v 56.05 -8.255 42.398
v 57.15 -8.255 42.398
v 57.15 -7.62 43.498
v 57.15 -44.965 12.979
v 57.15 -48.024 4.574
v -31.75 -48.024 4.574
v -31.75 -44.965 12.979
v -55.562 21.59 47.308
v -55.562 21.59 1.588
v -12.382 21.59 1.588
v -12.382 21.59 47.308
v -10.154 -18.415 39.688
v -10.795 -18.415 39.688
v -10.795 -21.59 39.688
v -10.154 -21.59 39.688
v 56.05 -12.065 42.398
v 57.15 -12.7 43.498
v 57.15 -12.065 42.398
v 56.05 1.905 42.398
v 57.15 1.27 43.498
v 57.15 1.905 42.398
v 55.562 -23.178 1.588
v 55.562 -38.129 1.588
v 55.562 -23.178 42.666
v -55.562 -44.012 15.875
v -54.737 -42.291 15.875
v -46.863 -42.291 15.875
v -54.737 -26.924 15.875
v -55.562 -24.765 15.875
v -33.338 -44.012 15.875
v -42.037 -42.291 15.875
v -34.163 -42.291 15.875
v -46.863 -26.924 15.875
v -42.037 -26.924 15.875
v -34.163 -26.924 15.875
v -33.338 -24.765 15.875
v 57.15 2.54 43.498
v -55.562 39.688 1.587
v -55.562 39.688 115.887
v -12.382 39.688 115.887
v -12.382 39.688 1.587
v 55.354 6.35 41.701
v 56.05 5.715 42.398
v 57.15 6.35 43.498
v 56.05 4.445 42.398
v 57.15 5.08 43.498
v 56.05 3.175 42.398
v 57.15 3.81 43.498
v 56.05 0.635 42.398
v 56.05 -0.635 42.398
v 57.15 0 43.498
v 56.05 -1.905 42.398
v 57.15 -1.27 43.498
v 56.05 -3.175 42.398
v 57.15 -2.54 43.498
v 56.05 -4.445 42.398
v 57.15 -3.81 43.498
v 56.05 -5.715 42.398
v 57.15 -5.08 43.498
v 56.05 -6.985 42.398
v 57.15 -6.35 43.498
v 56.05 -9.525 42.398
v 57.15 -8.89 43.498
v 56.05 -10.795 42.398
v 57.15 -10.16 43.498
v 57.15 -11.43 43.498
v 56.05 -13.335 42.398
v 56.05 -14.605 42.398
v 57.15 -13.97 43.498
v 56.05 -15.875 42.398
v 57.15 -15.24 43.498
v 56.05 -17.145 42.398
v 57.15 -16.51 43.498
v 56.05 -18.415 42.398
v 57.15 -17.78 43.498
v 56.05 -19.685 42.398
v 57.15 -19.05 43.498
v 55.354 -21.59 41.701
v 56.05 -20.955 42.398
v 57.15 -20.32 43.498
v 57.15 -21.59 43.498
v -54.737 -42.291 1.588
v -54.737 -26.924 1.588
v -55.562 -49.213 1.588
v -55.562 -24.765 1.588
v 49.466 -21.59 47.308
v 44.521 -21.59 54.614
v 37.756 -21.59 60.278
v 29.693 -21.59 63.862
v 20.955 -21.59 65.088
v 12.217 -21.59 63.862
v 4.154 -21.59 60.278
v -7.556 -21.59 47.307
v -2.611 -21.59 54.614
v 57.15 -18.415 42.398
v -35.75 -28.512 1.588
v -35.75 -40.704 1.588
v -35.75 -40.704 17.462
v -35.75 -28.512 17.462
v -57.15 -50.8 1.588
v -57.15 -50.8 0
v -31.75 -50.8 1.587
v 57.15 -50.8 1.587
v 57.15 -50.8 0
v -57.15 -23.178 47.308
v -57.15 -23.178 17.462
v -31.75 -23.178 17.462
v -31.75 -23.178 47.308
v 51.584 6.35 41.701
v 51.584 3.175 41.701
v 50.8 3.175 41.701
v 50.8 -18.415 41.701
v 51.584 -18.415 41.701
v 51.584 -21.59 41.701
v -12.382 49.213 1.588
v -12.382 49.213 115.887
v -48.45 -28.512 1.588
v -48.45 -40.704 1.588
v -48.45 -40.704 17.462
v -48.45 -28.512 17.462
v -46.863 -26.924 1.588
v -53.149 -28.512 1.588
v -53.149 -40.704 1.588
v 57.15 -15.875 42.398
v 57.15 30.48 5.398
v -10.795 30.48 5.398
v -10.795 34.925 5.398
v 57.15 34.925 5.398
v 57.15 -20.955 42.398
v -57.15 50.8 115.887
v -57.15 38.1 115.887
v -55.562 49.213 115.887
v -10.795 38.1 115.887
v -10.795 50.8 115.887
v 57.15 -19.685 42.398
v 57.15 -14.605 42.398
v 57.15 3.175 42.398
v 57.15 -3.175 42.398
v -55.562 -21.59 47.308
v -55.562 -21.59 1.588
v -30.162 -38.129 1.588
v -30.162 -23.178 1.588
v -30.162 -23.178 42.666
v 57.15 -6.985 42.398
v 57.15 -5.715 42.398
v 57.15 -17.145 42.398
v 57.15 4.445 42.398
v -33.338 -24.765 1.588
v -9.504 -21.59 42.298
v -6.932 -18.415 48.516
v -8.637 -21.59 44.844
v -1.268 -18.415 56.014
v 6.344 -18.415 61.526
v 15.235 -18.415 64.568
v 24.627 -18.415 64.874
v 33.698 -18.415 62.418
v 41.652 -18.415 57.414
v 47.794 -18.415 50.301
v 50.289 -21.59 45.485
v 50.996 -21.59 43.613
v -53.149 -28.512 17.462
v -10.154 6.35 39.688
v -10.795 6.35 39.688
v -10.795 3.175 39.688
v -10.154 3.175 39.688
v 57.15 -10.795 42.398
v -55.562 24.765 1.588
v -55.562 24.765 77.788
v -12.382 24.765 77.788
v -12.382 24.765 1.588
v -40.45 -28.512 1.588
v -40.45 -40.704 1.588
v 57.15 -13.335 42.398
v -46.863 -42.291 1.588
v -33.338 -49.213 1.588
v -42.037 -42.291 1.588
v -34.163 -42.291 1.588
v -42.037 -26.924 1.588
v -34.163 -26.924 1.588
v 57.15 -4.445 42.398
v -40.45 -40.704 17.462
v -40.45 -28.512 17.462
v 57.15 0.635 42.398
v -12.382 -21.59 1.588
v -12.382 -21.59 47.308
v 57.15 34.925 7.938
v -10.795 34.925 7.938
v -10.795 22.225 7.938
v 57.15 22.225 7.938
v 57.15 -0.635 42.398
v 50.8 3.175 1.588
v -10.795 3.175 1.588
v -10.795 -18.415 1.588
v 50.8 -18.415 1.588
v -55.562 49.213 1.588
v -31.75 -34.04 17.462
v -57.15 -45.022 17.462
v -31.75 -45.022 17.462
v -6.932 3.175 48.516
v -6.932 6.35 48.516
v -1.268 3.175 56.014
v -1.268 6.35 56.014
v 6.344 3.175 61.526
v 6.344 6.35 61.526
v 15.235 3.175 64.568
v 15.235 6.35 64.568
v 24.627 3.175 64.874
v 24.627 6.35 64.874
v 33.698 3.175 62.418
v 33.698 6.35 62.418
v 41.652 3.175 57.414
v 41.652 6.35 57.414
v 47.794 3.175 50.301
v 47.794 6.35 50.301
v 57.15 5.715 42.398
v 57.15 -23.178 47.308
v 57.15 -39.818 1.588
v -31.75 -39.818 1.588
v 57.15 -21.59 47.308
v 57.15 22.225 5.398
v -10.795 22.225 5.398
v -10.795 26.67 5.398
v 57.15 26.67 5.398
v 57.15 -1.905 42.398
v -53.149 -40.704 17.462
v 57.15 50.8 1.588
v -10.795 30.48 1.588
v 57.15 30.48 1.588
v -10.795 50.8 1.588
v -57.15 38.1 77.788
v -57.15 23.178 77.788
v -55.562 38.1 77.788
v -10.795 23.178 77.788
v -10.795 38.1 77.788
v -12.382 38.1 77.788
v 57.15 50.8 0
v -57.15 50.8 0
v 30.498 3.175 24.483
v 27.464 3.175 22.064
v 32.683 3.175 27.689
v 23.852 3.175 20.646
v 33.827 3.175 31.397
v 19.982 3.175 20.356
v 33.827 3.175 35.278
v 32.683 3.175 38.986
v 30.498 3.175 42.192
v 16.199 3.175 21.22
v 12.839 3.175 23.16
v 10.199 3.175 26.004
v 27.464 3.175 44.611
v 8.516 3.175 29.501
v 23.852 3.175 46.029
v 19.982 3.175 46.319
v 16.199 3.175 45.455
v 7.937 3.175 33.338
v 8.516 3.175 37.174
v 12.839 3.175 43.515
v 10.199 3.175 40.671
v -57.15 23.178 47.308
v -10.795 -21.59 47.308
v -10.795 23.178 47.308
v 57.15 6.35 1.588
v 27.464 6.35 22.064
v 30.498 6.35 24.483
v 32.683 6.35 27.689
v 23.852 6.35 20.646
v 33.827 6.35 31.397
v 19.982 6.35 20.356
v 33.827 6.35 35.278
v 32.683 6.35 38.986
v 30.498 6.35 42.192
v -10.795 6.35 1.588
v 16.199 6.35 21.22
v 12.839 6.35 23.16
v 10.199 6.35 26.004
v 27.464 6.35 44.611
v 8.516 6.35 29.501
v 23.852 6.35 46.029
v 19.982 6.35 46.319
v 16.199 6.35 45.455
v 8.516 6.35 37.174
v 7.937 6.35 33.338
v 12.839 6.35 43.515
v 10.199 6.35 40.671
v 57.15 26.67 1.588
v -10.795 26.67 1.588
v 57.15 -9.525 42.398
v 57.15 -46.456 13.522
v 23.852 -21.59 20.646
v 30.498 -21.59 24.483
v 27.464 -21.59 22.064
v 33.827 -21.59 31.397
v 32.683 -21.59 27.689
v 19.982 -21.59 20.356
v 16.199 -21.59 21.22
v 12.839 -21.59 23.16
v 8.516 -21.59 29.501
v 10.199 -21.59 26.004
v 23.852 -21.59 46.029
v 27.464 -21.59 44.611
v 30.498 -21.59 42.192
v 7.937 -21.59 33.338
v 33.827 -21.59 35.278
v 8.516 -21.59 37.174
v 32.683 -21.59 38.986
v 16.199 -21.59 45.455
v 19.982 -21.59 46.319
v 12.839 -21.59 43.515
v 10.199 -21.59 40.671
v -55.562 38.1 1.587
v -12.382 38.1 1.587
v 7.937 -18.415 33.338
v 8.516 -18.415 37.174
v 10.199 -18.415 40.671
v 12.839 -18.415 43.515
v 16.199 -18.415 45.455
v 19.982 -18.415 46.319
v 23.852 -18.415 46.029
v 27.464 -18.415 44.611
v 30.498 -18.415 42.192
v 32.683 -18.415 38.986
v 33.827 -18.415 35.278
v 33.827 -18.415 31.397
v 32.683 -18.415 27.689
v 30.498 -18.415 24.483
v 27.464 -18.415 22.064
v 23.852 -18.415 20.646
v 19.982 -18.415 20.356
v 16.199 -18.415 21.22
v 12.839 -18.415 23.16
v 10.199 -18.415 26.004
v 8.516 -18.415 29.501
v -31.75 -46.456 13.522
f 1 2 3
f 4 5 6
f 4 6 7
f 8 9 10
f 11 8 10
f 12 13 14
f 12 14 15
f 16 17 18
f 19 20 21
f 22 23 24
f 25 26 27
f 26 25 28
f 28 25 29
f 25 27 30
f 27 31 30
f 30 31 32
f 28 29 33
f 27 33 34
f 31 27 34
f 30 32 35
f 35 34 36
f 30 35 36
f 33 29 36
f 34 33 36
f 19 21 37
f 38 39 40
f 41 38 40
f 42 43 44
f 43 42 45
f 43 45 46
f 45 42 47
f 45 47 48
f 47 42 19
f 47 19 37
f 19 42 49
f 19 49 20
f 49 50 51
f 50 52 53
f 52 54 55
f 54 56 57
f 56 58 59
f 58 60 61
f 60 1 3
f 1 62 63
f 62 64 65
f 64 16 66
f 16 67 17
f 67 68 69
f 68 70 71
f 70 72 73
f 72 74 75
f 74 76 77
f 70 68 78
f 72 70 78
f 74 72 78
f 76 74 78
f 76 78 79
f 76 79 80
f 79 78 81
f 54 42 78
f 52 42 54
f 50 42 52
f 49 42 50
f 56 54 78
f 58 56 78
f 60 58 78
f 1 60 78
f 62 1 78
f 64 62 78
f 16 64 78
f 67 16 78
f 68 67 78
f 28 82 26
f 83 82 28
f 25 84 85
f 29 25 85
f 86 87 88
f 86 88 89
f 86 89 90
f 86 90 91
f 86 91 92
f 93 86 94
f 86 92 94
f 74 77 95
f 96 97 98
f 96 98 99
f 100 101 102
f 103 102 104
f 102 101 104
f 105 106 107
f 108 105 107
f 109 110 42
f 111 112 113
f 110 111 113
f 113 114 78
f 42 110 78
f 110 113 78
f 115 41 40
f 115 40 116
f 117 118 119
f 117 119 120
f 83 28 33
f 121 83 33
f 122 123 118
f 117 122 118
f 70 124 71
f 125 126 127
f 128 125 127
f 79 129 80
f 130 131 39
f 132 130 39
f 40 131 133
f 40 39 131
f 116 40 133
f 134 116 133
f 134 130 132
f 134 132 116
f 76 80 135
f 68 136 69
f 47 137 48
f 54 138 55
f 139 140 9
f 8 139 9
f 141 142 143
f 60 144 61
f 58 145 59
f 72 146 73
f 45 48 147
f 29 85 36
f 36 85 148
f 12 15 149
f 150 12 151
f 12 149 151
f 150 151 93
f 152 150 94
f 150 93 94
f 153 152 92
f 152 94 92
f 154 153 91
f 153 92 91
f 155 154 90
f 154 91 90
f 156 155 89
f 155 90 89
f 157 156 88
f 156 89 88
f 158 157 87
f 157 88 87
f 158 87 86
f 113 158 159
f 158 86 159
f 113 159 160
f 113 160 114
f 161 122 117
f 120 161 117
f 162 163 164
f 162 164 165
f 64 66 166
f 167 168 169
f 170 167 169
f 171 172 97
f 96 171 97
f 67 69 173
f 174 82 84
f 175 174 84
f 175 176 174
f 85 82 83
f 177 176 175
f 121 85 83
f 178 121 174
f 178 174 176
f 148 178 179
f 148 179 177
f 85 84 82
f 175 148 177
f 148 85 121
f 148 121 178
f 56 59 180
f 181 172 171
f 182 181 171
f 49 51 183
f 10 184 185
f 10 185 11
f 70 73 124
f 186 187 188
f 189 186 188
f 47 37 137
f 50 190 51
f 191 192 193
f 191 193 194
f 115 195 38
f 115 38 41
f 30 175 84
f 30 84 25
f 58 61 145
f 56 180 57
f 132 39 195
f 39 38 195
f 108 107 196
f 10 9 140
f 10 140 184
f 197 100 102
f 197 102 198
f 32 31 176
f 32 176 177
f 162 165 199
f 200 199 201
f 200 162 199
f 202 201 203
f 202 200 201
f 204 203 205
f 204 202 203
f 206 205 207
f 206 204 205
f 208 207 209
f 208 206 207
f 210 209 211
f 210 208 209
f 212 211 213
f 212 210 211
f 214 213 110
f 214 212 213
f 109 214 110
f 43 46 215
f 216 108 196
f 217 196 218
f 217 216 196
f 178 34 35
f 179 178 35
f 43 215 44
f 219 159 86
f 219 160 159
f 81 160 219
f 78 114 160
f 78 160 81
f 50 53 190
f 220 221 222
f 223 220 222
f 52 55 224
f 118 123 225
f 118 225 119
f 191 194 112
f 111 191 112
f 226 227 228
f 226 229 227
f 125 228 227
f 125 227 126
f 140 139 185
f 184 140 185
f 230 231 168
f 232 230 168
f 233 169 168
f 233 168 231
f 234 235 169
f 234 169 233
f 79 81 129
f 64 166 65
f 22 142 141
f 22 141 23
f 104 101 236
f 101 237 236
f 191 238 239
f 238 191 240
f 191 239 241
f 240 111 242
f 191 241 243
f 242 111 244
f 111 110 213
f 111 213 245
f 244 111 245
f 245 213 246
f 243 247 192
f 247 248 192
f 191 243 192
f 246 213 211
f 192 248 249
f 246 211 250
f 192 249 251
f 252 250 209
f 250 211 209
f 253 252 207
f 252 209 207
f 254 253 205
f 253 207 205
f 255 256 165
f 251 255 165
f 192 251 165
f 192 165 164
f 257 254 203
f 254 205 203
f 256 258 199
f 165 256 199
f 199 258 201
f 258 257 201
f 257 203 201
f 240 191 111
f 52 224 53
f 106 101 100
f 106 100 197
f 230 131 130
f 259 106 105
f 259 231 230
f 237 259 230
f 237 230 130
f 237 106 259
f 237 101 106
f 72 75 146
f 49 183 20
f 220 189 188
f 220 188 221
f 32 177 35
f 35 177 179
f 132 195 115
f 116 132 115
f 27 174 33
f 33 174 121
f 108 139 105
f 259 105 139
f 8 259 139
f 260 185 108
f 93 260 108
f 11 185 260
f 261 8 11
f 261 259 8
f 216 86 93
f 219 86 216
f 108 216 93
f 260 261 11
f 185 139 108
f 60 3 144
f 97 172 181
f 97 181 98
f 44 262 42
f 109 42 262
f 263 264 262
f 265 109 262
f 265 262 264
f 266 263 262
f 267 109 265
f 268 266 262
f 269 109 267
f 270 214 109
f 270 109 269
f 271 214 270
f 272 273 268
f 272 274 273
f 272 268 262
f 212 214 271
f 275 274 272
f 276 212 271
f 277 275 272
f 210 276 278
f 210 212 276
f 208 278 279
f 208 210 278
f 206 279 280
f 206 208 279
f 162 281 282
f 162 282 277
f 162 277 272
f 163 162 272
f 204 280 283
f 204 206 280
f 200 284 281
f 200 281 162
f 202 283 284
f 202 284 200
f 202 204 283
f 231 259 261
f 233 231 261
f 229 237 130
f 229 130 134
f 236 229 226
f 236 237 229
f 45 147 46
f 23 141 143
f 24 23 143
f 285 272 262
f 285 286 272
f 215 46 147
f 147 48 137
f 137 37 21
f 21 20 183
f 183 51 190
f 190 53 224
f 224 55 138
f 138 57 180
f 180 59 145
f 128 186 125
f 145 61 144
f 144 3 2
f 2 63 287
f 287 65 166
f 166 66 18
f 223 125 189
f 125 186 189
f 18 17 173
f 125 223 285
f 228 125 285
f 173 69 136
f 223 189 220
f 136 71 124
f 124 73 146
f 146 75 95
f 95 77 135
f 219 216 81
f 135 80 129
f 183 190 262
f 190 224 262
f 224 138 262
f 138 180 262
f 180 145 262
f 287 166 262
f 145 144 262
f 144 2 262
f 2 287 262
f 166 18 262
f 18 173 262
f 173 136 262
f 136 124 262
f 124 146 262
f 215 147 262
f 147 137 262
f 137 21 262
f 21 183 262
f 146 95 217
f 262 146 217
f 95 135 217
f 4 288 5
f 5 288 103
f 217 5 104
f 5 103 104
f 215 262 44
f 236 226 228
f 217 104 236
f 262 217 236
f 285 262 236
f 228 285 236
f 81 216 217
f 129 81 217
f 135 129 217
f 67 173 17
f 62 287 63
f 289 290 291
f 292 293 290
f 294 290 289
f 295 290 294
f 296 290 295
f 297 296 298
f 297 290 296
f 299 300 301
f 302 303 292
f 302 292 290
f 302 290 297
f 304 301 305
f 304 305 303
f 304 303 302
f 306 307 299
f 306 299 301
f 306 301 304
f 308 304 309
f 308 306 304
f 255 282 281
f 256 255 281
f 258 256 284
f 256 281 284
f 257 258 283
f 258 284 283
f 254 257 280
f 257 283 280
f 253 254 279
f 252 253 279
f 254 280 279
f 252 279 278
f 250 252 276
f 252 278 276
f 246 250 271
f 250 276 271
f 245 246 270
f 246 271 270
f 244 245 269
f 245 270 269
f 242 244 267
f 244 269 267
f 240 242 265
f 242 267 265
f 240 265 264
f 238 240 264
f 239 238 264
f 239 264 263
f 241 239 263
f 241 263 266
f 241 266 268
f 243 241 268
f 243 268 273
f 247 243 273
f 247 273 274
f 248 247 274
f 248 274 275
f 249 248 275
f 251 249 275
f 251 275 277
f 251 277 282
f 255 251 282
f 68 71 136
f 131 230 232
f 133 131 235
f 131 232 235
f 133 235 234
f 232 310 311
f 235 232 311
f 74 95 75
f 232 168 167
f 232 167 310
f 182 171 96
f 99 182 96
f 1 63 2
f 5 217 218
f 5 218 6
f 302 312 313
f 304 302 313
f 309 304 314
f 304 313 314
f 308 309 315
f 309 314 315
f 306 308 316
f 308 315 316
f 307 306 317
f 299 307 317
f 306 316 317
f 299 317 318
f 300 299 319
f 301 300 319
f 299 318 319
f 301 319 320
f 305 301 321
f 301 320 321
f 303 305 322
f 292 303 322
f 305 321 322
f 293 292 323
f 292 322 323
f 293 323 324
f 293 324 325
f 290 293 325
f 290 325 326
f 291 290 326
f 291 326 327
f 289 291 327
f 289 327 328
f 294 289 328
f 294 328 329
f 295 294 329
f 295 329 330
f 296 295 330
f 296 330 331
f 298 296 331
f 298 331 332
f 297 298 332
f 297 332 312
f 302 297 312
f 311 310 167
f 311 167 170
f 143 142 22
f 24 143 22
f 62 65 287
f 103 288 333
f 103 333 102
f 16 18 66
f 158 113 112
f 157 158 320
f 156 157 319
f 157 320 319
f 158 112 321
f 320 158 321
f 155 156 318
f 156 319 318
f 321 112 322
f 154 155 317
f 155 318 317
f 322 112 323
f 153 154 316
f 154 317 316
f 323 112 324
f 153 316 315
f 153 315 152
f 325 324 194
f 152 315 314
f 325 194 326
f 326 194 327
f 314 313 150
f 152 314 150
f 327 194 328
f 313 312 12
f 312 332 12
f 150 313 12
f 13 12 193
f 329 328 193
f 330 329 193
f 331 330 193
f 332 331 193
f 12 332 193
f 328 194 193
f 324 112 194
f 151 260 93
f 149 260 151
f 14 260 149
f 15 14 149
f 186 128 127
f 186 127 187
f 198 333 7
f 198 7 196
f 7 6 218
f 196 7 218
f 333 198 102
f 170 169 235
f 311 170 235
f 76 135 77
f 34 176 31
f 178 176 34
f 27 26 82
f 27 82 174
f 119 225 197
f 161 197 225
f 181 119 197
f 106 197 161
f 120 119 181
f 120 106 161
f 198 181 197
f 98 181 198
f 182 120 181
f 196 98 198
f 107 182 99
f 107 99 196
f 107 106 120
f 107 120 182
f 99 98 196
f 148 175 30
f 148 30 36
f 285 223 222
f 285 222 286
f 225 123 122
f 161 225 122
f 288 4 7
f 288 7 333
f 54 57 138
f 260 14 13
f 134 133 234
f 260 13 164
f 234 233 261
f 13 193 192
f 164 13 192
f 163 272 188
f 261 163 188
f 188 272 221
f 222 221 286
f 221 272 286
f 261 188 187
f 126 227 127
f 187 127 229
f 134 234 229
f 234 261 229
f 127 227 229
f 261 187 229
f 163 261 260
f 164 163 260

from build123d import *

# Parameters (mm, degrees)
F0_W      = 114.3
F0_H      = 101.6
F1_DEPTH  = 1.5875
F2_W      = 46.355
F2_H      = 46.355
F2_W_2    = 43.18
F2_H_2    = 43.18
F3_DEPTH  = 45.72
F4_W      = 88.9
F4_H      = 1.5875
F5_DEPTH  = 45.72
F7_DEPTH  = 88.9
F9_DEPTH  = 1.5875
F11_DEPTH = 1.5875
F12_W     = 25.4
F12_H     = 27.6225
F12_W_2   = 22.225
F12_H_2   = 24.4475
F12_W_3   = 7.874
F12_H_3   = 15.367
F12_W_4   = 4.699
F12_H_4   = 12.192
F13_DEPTH = 15.875
F14_W     = 25.4
F14_H     = 27.6225
F14_W_2   = 4.699
F14_H_2   = 12.192
F15_DEPTH = 1.5875
F17_DEPTH = 25.4
F18_W     = 6.35
F18_H     = 21.59
F19_DEPTH = 38.1
F21_DEPTH = 27.94
F23_DEPTH = 25.4
F25_DEPTH = 3.175
F26_R     = 31.75
F27_DEPTH = 3.175
F28_R     = 13.0175
F29_DEPTH = 27.94
F30_W     = 46.355
F30_H     = 27.6225
F30_W_2   = 43.18
F30_H_2   = 24.4475
F31_DEPTH = 76.2
F32_W     = 46.355
F32_H     = 12.7
F33_DEPTH = 1.5875
F34_W     = 43.18
F34_H     = 1.5875
F35_DEPTH = 76.2
F36_W     = 46.355
F36_H     = 12.7
F36_W_2   = 43.18
F36_H_2   = 9.525
F37_DEPTH = 38.1
F38_W     = 43.18
F38_H     = 9.525
F39_DEPTH = 25.4
F41_DEPTH = 67.945
F43_DEPTH = 25.4


with BuildPart() as f1:
    # F0 (on Top) → F1 (new body)
    with BuildSketch(Plane.XY):
        Rectangle(F0_W, F0_H)
    extrude(amount=F1_DEPTH)

    # F2 (on face) → F3 (join)
    with BuildSketch(Plane.XY.offset(1.5875)):
        with Locations((-33.9725, 0)):
            Rectangle(F2_W, F2_H)
        with Locations((-33.9725, 0)):
            Rectangle(F2_W_2, F2_H_2, mode=Mode.SUBTRACT)
    extrude(amount=F3_DEPTH)

    # F4 (on face) → F5 (join)
    with BuildSketch(Plane.XY.offset(1.5875)):
        with Locations((12.7, -22.38375)):
            Rectangle(F4_W, F4_H)
    extrude(amount=F5_DEPTH)

    # F6 (on face) → F7 (join)
    with BuildSketch(Plane.YZ.offset(57.15)):
        Polygon((-23.1775, 47.3075), (-39.818219, 1.5875), (-38.128837, 1.5875), (-23.1775, 42.665961), align=None)
        Polygon((-46.456344, 13.521596), (-50.8, 1.5875), (-39.818219, 1.5875), (-48.023614, 4.574019), (-44.964582, 12.978639), align=None)
    extrude(amount=-F7_DEPTH)

    # F8 (on face) → F9 (join)
    with BuildSketch(Plane.YZ.offset(57.15)):
        Polygon((-23.1775, 1.5875), (-23.1775, 42.665961), (-38.128837, 1.5875), align=None)
    extrude(amount=-F9_DEPTH)

    # F10 (on face) → F11 (join)
    with BuildSketch(Plane(origin=(-31.75, 0, 0), x_dir=(0, -1, 0), z_dir=(-1, 0, 0))):
        Polygon((23.1775, 1.5875), (38.128837, 1.5875), (23.1775, 42.665961), align=None)
    extrude(amount=-F11_DEPTH)

    # F12 (on face) → F13 (join)
    with BuildSketch(Plane.XY.offset(1.5875)):
        with Locations((-44.45, -36.98875)):
            Rectangle(F12_W, F12_H)
        with Locations((-44.45, -36.98875)):
            Rectangle(F12_W_2, F12_H_2, mode=Mode.SUBTRACT)
        with Locations((-38.1, -34.6075)):
            Rectangle(F12_W_3, F12_H_3)
        with Locations((-38.1, -34.6075)):
            Rectangle(F12_W_4, F12_H_4, mode=Mode.SUBTRACT)
        with Locations((-50.8, -34.6075)):
            Rectangle(F12_W_3, F12_H_3)
        with Locations((-50.8, -34.6075)):
            Rectangle(F12_W_4, F12_H_4, mode=Mode.SUBTRACT)
    extrude(amount=F13_DEPTH)

    # F14 (on face) → F15 (join)
    with BuildSketch(Plane.XY.offset(17.4625)):
        with Locations((-44.45, -36.98875)):
            Rectangle(F14_W, F14_H)
        with Locations((-50.8, -34.6075)):
            Rectangle(F14_W_2, F14_H_2, mode=Mode.SUBTRACT)
        with Locations((-38.1, -34.6075)):
            Rectangle(F14_W_2, F14_H_2, mode=Mode.SUBTRACT)
    extrude(amount=-F15_DEPTH)

    # F16 (on face) → F17 (cut)
    with BuildSketch(Plane.YZ.offset(-31.75)):
        Polygon((-50.8, 17.4625), (-50.8, 1.5875), (-45.021973, 17.4625), align=None)
    extrude(amount=-F17_DEPTH, mode=Mode.SUBTRACT)

    # F18 (on face) → F19 (join)
    with BuildSketch(Plane.XY.offset(1.5875)):
        Polygon((-10.795, -18.415), (-10.795, -21.59), (57.15, -21.59), (57.15, -18.415), (50.8, -18.415), align=None)
        with Locations((53.975, -7.62)):
            Rectangle(F18_W, F18_H)
        Polygon((50.8, 3.175), (57.15, 3.175), (57.15, 6.35), (-10.795, 6.35), (-10.795, 3.175), align=None)
    extrude(amount=F19_DEPTH)

    # F20 (on face) → F21 (join, through all)
    with BuildSketch(Plane(origin=(0, -21.59, 0), x_dir=(-1, 0, 0), z_dir=(0, 1, 0))):
        Polygon((-55.353949, 41.701449), (-57.15, 43.4975), (-57.15, 39.6875), (-50.8, 39.6875), (-50.8, 41.701449), align=None)
    extrude(amount=F21_DEPTH)

    # F22 (on face) → F23 (cut)
    with BuildSketch(Plane.YZ.offset(57.15)):
        Polygon((-20.32, 43.4975), (-21.59, 43.4975), (-20.955, 42.397648), align=None)
        Polygon((6.35, 43.4975), (5.08, 43.4975), (5.715, 42.397648), align=None)
        Polygon((5.08, 43.4975), (3.81, 43.4975), (4.445, 42.397648), align=None)
        Polygon((3.81, 43.4975), (2.54, 43.4975), (3.175, 42.397648), align=None)
        Polygon((2.54, 43.4975), (1.27, 43.4975), (1.905, 42.397648), align=None)
        Polygon((1.27, 43.4975), (0, 43.4975), (0.635, 42.397648), align=None)
        Polygon((0, 43.4975), (-1.27, 43.4975), (-0.635, 42.397648), align=None)
        Polygon((-1.27, 43.4975), (-2.54, 43.4975), (-1.905, 42.397648), align=None)
        Polygon((-2.54, 43.4975), (-3.81, 43.4975), (-3.175, 42.397648), align=None)
        Polygon((-3.81, 43.4975), (-5.08, 43.4975), (-4.445, 42.397648), align=None)
        Polygon((-5.08, 43.4975), (-6.35, 43.4975), (-5.715, 42.397648), align=None)
        Polygon((-6.35, 43.4975), (-7.62, 43.4975), (-6.985, 42.397648), align=None)
        Polygon((-7.62, 43.4975), (-8.89, 43.4975), (-8.255, 42.397648), align=None)
        Polygon((-8.89, 43.4975), (-10.16, 43.4975), (-9.525, 42.397648), align=None)
        Polygon((-10.16, 43.4975), (-11.43, 43.4975), (-10.795, 42.397648), align=None)
        Polygon((-11.43, 43.4975), (-12.7, 43.4975), (-12.065, 42.397648), align=None)
        Polygon((-12.7, 43.4975), (-13.97, 43.4975), (-13.335, 42.397648), align=None)
        Polygon((-13.97, 43.4975), (-15.24, 43.4975), (-14.605, 42.397648), align=None)
        Polygon((-15.24, 43.4975), (-16.51, 43.4975), (-15.875, 42.397648), align=None)
        Polygon((-16.51, 43.4975), (-17.78, 43.4975), (-17.145, 42.397648), align=None)
        Polygon((-17.78, 43.4975), (-19.05, 43.4975), (-18.415, 42.397648), align=None)
        Polygon((-19.05, 43.4975), (-20.32, 43.4975), (-19.685, 42.397648), align=None)
    extrude(amount=-F23_DEPTH, mode=Mode.SUBTRACT)

    # F24 (on face) → F25 (join)
    with BuildSketch(Plane(origin=(0, 6.35, 0), x_dir=(-1, 0, 0), z_dir=(0, 1, 0))):
        with BuildLine():
            Line((-52.06352, 39.6875), (10.15352, 39.6875))
            ThreePointArc((10.15352, 39.6875), (-20.955, 65.0875), (-52.06352, 39.6875))
        make_face()
    extrude(amount=-F25_DEPTH)

    # F26 (on face) → F27 (join)
    with BuildSketch(Plane(origin=(0, -21.59, 0), x_dir=(-1, 0, 0), z_dir=(0, 1, 0))):
        with Locations((-20.955, 33.3375)):
            Circle(F26_R)
    extrude(amount=F27_DEPTH)

    # F28 (on face) → F29 (cut)
    with BuildSketch(Plane(origin=(0, 6.35, 0), x_dir=(-1, 0, 0), z_dir=(0, 1, 0))):
        with Locations((-20.955, 33.3375)):
            Circle(F28_R)
    extrude(amount=-F29_DEPTH, mode=Mode.SUBTRACT)

    # F30 (on face) → F31 (join)
    with BuildSketch(Plane.XY.offset(1.5875)):
        with Locations((-33.9725, 36.98875)):
            Rectangle(F30_W, F30_H)
        with Locations((-33.9725, 36.98875)):
            Rectangle(F30_W_2, F30_H_2, mode=Mode.SUBTRACT)
    extrude(amount=F31_DEPTH)

    # F32 (on face) → F33 (join)
    with BuildSketch(Plane.XY.offset(77.7875)):
        with Locations((-33.9725, 44.45)):
            Rectangle(F32_W, F32_H)
    extrude(amount=-F33_DEPTH)

    # F34 (on face) → F35 (join)
    with BuildSketch(Plane.XY.offset(77.7875)):
        with Locations((-33.9725, 38.89375)):
            Rectangle(F34_W, F34_H)
    extrude(amount=-F35_DEPTH)

    # F36 (on face) → F37 (join)
    with BuildSketch(Plane.XY.offset(77.7875)):
        with Locations((-33.9725, 44.45)):
            Rectangle(F36_W, F36_H)
        with Locations((-33.9725, 44.45)):
            Rectangle(F36_W_2, F36_H_2, mode=Mode.SUBTRACT)
    extrude(amount=F37_DEPTH)

    # F38 (on face) → F39 (cut)
    with BuildSketch(Plane.XY.offset(77.7875)):
        with Locations((-33.9725, 44.45)):
            Rectangle(F38_W, F38_H)
    extrude(amount=-F39_DEPTH, mode=Mode.SUBTRACT)

    # F40 (on face) → F41 (join, through all)
    with BuildSketch(Plane.YZ.offset(-10.795)):
        Polygon((26.67, 5.3975), (26.67, 1.5875), (30.48, 1.5875), (30.48, 5.3975), (34.925, 5.3975), (34.925, 7.9375), (22.225, 7.9375), (22.225, 5.3975), align=None)
    extrude(amount=F41_DEPTH)

    # F42 (on face) → F43 (join)
    with BuildSketch(Plane.YZ.offset(-31.75)):
        Polygon((-43.434473, 17.4625), (-45.021973, 17.4625), (-50.8, 1.5875), (-50.8, 0), (-49.790303, 0), align=None)
    extrude(amount=-F43_DEPTH)


solid = f1.part
